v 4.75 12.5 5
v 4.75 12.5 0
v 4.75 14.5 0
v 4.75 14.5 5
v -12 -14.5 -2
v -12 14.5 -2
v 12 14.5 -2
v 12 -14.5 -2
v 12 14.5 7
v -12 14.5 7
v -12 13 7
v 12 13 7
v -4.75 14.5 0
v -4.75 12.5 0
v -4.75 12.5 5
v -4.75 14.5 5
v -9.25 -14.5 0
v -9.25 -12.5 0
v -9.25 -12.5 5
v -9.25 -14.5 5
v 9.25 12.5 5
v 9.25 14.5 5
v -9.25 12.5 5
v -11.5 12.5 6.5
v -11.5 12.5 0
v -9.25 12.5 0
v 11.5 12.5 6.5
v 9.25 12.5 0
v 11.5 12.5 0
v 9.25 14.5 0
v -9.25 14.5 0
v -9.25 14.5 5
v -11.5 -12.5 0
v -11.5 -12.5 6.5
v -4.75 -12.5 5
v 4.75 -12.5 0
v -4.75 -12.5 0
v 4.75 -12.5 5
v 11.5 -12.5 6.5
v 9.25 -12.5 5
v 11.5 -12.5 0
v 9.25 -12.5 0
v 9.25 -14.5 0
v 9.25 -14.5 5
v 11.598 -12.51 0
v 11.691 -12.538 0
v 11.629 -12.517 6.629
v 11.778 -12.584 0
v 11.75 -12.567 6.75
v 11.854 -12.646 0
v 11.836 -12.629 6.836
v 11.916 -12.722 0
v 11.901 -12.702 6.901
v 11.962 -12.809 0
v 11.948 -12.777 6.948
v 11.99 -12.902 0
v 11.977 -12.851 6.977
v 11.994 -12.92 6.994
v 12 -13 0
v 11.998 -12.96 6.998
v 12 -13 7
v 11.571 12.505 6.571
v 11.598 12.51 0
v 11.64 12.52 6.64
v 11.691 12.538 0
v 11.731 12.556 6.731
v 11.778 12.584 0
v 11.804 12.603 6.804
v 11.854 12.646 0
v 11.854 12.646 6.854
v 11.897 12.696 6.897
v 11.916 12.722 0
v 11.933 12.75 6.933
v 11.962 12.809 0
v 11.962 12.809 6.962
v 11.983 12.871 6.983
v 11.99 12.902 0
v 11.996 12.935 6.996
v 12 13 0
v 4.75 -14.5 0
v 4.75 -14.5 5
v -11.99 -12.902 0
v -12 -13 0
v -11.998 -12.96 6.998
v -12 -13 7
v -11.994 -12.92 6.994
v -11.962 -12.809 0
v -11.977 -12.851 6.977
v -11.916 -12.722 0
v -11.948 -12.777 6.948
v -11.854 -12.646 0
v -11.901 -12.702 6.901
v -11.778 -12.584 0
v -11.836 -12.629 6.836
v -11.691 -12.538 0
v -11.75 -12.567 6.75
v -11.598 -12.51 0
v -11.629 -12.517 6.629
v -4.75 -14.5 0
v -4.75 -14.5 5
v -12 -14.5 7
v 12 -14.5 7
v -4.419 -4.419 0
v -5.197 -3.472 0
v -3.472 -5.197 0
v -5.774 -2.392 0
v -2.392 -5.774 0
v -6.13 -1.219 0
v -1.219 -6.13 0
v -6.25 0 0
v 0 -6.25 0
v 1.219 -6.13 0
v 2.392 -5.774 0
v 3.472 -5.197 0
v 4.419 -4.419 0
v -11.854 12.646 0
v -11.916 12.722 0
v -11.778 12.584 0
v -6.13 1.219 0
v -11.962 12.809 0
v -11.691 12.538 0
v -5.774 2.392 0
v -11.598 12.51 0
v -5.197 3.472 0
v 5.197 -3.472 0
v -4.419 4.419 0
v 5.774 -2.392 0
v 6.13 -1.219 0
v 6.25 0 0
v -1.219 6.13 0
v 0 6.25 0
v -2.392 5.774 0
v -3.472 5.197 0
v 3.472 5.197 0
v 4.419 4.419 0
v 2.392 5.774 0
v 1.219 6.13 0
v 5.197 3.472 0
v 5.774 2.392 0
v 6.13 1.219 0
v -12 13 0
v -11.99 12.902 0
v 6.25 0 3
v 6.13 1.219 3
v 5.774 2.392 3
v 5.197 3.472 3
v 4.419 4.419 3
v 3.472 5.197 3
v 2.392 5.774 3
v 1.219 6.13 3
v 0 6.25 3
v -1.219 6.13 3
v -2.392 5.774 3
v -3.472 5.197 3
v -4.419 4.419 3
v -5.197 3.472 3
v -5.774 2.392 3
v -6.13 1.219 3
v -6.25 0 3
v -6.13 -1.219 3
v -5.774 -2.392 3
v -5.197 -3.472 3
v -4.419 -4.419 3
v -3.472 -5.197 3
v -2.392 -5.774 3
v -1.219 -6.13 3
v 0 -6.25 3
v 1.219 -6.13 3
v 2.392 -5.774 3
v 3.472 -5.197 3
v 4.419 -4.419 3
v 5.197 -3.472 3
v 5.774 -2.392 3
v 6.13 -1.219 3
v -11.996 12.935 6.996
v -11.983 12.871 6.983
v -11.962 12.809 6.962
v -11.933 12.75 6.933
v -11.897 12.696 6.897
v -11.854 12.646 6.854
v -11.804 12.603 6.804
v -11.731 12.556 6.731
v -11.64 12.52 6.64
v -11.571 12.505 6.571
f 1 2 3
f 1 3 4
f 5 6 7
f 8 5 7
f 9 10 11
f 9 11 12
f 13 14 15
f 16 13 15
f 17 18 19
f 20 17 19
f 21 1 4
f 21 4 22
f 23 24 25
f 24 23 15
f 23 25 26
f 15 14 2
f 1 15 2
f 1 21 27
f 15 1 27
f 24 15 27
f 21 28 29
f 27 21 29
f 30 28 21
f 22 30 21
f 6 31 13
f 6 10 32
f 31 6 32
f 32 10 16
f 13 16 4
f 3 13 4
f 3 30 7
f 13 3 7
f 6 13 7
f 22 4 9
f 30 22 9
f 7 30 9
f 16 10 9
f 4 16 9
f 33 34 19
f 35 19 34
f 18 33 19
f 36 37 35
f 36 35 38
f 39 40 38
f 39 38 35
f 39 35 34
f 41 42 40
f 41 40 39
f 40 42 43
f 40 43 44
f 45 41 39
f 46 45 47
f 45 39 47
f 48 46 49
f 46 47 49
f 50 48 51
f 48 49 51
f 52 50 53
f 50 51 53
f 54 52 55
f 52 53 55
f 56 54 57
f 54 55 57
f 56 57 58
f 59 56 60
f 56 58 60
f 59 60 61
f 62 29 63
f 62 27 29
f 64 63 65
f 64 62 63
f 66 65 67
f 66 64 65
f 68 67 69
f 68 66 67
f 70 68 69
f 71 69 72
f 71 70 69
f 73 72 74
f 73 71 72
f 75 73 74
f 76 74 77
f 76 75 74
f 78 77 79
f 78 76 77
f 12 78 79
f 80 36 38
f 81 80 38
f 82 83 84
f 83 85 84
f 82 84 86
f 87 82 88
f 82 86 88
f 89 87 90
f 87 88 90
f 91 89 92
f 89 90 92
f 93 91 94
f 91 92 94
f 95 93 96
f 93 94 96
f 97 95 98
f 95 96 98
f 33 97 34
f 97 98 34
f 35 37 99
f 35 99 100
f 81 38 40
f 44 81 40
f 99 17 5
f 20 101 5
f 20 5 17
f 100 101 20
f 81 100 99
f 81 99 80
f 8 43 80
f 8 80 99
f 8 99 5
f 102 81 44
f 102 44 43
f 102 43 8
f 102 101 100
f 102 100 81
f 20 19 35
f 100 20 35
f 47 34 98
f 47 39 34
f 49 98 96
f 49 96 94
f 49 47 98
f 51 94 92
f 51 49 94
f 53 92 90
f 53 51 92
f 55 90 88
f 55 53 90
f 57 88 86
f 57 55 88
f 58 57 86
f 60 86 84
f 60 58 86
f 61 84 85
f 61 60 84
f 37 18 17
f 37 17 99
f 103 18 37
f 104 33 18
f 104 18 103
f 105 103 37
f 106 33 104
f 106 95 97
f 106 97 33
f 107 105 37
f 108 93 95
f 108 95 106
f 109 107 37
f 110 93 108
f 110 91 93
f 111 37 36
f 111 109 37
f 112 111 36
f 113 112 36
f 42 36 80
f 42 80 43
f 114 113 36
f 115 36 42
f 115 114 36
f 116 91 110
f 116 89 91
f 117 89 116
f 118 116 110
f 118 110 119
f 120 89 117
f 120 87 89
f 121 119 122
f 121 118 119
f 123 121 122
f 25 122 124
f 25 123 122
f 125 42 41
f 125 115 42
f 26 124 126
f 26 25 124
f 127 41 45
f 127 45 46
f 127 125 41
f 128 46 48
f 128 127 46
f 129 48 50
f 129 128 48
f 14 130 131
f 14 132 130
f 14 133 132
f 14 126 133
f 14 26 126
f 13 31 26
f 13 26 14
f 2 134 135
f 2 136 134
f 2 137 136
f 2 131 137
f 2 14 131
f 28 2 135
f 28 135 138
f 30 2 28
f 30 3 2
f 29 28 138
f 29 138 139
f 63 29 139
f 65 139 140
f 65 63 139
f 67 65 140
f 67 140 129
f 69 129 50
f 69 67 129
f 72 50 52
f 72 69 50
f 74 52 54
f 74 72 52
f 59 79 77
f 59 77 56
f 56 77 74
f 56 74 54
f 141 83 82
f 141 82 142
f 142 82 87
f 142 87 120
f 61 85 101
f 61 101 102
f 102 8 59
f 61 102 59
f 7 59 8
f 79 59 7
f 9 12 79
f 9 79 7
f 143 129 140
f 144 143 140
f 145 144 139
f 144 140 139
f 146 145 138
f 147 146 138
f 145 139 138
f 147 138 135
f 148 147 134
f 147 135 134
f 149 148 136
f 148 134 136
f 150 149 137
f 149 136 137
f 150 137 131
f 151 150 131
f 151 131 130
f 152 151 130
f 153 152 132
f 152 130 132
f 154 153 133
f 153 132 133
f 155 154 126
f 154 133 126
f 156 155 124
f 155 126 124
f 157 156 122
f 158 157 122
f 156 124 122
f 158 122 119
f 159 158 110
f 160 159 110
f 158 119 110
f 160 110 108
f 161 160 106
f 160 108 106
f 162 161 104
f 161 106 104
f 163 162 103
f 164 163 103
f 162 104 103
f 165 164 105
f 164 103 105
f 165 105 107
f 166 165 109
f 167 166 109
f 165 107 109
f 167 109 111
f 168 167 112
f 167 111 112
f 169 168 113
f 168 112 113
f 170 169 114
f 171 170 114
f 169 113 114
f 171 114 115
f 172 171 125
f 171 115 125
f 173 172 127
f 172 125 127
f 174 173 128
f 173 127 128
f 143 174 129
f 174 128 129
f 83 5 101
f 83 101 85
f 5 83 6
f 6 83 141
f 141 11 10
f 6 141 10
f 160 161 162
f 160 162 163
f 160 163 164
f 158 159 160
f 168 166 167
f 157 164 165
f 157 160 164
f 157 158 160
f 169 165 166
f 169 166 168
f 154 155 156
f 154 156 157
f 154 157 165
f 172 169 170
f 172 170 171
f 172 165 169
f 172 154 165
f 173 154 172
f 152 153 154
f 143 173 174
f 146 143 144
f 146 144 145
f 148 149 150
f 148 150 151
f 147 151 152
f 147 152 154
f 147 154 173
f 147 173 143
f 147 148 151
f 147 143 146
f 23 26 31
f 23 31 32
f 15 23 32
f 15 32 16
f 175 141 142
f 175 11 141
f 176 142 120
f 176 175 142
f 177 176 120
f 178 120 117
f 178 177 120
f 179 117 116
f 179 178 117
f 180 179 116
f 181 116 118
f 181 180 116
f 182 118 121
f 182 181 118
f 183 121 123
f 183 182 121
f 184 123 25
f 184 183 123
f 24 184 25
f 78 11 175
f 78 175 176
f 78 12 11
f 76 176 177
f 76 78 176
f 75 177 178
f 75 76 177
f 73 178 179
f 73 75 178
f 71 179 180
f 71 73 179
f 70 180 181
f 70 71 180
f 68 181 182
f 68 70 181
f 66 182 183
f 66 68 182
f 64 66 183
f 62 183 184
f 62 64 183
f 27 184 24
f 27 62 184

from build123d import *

# Parameters (mm, degrees)
F0_W          = 24
F0_H          = 25
F1_DEPTH      = 2
F2_R          = 6.25
F3_DEPTH      = 3
F4_W          = 24
F4_H          = 2
F5_DEPTH      = 7
F5_DEPTH_BACK = 2
F7_START      = 12
F6_W          = 4.5
F6_H          = 5
F7_DEPTH      = 3
F8_START      = -12
F8_DEPTH      = 3
F9_R          = 0.5


with BuildPart() as f1:
    # F0 (on Top) → F1 (new body)
    with BuildSketch(Plane.XY):
        Rectangle(F0_W, F0_H)
    extrude(amount=-F1_DEPTH)

    # F2 (on Top) → F3 (join)
    with BuildSketch(Plane.XY):
        Circle(F2_R)
    extrude(amount=F3_DEPTH)

    # F4 (on Top) → F5 (join, two sides)
    with BuildSketch(Plane.XY) as f5_sk:
        with Locations((0, 13.5)):
            Rectangle(F4_W, F4_H)
        with Locations((0, -13.5)):
            Rectangle(F4_W, F4_H)
    extrude(amount=F5_DEPTH)
    extrude(f5_sk.sketch, amount=-F5_DEPTH_BACK)

    # F6 (on Front) → F7 (cut)
    with BuildSketch(Plane.XZ.offset(F7_START)):
        with Locations((-7, 2.5)):
            Rectangle(F6_W, F6_H)
        with Locations((7, 2.5)):
            Rectangle(F6_W, F6_H)
    extrude(amount=F7_DEPTH, mode=Mode.SUBTRACT)

    # F6 (on Front) → F8 (cut)
    with BuildSketch(Plane.XZ.offset(F8_START)):
        with Locations((-7, 2.5)):
            Rectangle(F6_W, F6_H)
        with Locations((7, 2.5)):
            Rectangle(F6_W, F6_H)
    extrude(amount=-F8_DEPTH, mode=Mode.SUBTRACT)

    # F9
    f9_edges = [f1.edges().sort_by_distance(p)[0] for p in [
        (0, -12.5, 7),
        (0, 12.5, 7),
        (12, 12.5, 3.5),
        (12, -12.5, 3.5),
        (-12, -12.5, 3.5),
        (-12, 12.5, 3.5),
    ]]
    fillet(f9_edges, radius=F9_R)


solid = f1.part
